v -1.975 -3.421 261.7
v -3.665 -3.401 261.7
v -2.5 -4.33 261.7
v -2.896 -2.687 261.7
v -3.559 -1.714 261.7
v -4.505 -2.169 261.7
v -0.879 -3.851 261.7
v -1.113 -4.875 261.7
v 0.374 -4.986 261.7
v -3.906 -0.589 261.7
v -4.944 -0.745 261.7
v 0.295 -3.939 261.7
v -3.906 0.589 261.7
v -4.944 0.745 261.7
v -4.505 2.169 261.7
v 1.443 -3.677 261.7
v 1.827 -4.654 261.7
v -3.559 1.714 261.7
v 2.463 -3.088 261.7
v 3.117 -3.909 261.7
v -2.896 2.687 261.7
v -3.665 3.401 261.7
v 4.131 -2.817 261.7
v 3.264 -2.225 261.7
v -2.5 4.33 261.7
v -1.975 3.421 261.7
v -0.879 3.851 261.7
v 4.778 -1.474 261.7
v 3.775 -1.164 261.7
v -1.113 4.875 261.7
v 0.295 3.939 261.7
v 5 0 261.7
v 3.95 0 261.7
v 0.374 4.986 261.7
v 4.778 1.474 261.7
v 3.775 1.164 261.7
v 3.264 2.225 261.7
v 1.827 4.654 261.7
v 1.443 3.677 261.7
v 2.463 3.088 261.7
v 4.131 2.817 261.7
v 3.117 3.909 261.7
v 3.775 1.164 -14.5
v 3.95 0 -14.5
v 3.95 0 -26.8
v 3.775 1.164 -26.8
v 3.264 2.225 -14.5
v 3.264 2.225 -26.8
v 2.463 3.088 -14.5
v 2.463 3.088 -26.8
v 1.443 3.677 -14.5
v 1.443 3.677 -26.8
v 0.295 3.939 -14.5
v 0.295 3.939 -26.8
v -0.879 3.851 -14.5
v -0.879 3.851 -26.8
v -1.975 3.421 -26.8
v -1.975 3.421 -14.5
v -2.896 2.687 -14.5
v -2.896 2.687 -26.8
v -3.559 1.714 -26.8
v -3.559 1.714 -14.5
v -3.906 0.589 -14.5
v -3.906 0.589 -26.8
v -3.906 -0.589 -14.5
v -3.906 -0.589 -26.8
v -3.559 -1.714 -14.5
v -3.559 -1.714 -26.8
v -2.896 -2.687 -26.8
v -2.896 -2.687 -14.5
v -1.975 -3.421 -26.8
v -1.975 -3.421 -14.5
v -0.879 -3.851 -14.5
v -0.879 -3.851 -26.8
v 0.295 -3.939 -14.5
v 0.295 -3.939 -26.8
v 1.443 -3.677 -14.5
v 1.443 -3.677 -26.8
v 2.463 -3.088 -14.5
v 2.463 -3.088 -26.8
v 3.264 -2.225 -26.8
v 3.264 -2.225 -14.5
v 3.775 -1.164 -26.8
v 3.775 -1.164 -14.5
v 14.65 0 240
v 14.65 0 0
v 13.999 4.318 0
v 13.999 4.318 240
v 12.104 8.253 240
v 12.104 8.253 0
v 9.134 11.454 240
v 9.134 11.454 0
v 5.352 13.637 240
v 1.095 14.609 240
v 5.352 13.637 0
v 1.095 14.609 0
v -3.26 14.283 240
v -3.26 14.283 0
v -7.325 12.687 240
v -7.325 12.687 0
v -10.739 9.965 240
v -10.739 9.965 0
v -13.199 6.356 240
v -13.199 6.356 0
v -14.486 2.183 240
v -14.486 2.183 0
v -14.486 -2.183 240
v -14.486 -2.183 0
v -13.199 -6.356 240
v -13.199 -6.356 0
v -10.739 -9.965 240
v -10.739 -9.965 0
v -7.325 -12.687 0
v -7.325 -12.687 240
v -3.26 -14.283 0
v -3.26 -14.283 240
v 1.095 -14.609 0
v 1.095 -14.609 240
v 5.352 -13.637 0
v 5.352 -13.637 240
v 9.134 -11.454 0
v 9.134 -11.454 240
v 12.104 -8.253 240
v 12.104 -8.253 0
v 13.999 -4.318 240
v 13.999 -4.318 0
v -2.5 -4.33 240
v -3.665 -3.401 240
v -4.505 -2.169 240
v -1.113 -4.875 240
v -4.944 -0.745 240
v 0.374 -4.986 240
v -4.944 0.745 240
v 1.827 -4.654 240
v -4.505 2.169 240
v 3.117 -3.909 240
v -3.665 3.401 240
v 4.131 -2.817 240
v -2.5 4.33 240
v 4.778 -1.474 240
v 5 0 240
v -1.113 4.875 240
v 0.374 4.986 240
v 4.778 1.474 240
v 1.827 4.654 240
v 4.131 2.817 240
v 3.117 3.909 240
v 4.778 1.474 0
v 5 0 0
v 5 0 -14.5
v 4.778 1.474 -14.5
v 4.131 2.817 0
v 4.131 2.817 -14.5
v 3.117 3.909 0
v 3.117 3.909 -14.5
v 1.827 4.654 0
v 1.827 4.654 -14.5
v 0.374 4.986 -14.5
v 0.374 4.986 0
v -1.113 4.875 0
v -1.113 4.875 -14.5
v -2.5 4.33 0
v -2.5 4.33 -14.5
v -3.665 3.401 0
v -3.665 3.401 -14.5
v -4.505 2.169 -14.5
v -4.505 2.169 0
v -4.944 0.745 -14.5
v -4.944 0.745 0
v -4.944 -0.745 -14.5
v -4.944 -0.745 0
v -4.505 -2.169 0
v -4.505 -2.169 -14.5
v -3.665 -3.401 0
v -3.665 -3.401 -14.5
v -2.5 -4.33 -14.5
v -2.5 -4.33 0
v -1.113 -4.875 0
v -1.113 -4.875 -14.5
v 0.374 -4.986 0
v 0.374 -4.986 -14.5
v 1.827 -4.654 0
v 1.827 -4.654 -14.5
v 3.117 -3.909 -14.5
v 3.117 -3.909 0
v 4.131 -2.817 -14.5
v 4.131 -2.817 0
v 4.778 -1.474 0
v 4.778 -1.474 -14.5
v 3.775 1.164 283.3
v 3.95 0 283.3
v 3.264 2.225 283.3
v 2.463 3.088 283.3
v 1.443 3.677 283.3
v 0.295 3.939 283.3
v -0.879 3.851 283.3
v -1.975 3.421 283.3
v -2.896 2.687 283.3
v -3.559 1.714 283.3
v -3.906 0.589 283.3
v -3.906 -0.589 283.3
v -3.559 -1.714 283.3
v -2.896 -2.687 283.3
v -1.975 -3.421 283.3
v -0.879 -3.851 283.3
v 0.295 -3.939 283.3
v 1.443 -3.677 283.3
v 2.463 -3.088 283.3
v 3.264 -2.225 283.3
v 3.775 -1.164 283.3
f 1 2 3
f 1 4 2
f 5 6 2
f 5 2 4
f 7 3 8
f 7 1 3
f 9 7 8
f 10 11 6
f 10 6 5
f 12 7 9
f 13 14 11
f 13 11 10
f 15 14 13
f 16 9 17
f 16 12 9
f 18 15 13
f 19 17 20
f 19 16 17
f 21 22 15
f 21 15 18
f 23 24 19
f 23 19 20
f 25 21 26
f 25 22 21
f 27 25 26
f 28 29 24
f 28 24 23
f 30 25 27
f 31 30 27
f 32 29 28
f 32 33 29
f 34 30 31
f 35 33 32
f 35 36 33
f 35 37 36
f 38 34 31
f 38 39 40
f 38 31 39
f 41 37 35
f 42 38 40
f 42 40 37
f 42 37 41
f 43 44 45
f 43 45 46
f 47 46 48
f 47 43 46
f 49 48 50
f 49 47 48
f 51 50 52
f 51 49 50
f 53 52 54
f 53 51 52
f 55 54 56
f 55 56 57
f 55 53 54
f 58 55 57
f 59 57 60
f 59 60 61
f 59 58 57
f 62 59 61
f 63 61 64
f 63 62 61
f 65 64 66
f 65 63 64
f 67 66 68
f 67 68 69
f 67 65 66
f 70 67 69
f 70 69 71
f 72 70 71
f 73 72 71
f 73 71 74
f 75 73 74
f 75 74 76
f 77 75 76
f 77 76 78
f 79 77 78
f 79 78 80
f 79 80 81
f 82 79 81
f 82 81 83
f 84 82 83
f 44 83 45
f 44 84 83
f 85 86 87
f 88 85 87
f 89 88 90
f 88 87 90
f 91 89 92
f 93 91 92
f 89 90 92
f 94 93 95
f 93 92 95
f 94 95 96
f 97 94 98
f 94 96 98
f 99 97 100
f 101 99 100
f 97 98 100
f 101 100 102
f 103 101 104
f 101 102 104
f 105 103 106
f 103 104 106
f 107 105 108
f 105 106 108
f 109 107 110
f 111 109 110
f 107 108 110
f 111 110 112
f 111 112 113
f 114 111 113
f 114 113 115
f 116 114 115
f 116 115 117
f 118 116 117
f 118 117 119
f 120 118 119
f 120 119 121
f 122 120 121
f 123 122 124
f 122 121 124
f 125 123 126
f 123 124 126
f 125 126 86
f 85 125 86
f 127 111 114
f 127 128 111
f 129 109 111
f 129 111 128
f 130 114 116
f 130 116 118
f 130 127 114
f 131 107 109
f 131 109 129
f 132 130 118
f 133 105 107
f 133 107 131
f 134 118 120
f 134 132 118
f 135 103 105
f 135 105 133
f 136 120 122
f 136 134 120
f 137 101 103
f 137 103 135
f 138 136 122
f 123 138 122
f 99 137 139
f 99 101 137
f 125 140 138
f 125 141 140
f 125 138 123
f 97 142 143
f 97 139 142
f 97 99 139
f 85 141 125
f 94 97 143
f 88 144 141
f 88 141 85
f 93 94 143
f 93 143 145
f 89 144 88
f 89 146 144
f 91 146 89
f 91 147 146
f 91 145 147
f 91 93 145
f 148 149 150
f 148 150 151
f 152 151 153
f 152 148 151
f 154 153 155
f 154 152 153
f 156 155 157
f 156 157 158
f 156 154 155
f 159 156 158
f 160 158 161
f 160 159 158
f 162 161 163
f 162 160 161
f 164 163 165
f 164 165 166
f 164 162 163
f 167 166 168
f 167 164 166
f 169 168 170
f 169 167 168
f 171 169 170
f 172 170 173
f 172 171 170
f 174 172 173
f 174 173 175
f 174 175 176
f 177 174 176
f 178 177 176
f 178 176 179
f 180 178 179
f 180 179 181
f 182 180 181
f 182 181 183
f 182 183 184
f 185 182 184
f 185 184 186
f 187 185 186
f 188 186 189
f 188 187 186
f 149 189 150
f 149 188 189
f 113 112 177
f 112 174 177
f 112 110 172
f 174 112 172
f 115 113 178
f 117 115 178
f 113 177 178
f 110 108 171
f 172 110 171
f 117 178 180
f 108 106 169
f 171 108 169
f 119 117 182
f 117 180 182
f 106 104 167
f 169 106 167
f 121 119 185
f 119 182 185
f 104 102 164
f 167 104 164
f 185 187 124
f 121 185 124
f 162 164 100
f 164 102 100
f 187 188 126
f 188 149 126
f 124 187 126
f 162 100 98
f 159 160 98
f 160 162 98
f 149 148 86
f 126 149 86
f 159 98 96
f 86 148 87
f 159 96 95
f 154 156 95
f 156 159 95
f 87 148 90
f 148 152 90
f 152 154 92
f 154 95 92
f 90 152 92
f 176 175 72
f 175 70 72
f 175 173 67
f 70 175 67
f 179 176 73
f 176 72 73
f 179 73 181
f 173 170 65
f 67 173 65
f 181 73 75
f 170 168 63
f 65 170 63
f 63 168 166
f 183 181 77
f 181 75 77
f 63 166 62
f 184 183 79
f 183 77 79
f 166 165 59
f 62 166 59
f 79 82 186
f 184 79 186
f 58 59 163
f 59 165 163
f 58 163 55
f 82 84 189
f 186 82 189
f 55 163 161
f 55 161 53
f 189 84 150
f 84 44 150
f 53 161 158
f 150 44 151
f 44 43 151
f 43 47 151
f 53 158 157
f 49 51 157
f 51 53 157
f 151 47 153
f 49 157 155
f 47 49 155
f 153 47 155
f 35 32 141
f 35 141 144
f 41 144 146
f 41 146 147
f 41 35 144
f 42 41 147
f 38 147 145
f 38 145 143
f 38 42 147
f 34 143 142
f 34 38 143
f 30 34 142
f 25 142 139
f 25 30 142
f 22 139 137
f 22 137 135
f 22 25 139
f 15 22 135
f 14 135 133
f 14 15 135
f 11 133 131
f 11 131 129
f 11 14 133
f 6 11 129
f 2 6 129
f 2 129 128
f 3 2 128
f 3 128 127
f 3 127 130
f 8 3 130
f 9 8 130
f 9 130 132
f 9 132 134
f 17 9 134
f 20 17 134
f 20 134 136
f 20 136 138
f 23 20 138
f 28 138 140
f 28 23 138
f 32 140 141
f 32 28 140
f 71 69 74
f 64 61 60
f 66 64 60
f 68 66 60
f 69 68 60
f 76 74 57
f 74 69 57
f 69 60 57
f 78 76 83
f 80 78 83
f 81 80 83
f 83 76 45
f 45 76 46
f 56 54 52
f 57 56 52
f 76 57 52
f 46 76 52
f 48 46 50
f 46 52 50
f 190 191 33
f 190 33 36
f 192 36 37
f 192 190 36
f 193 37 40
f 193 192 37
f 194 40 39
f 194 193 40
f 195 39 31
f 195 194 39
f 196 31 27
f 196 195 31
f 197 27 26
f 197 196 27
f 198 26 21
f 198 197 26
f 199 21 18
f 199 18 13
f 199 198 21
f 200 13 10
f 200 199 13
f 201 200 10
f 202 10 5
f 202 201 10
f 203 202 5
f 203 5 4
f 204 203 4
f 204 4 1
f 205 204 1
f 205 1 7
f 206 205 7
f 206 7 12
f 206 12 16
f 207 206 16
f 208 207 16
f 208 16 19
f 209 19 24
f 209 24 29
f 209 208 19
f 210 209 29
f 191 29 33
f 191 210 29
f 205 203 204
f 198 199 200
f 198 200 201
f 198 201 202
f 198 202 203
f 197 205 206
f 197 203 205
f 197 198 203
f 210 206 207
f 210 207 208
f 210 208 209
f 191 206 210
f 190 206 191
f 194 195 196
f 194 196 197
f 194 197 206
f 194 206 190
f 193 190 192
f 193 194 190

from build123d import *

# Parameters (mm, degrees)
SKETCH1_R           = 14.65
SKETCH1_R_2         = 5
SKETCH1_R_3         = 3.95
BOSS_EXTRUDE1_DEPTH = 240
SKETCH1_3_R         = 5
BOSS_EXTRUDE2_DEPTH = 14.5
BOSS_EXTRUDE3_START = -14.5
SKETCH1_4_R         = 3.95
BOSS_EXTRUDE3_DEPTH = 12.3
BOSS_EXTRUDE4_START = 261.7
SKETCH1_5_R         = 5
SKETCH1_5_R_2       = 3.95
BOSS_EXTRUDE4_DEPTH = 21.7
BOSS_EXTRUDE5_START = 283.3
SKETCH1_6_R         = 3.95
BOSS_EXTRUDE5_DEPTH = 21.6


with BuildPart() as part:
    # Sketch1 → Boss-Extrude1 (new body)
    # profile 1 of 3: a face of its own
    with BuildSketch(Plane.XY):
        Circle(SKETCH1_R)
        Circle(SKETCH1_R_2, mode=Mode.SUBTRACT)
    # profile 2 of 3: a face of its own
    with BuildSketch(Plane.XY):
        Circle(SKETCH1_R_2)
        Circle(SKETCH1_R_3, mode=Mode.SUBTRACT)
    # profile 3 of 3: a face of its own
    with BuildSketch(Plane.XY):
        Circle(SKETCH1_R_3)
    extrude(amount=BOSS_EXTRUDE1_DEPTH)

    # Sketch1<3> → Boss-Extrude2 (add)
    with BuildSketch(Plane.XY):
        Circle(SKETCH1_3_R)
    extrude(amount=-BOSS_EXTRUDE2_DEPTH)

    # Sketch1<4> → Boss-Extrude3 (add)
    with BuildSketch(Plane.XY.offset(BOSS_EXTRUDE3_START)):
        Circle(SKETCH1_4_R)
    extrude(amount=-BOSS_EXTRUDE3_DEPTH)

    # Sketch1<5> → Boss-Extrude4 (add)
    # profile 1 of 2: a face of its own
    with BuildSketch(Plane.XY.offset(BOSS_EXTRUDE4_START)):
        Circle(SKETCH1_5_R)
        Circle(SKETCH1_5_R_2, mode=Mode.SUBTRACT)
    # profile 2 of 2: a face of its own
    with BuildSketch(Plane.XY.offset(BOSS_EXTRUDE4_START)):
        Circle(SKETCH1_5_R_2)
    extrude(amount=-BOSS_EXTRUDE4_DEPTH)

    # Sketch1<6> → Boss-Extrude5 (add)
    with BuildSketch(Plane.XY.offset(BOSS_EXTRUDE5_START)):
        Circle(SKETCH1_6_R)
    extrude(amount=-BOSS_EXTRUDE5_DEPTH)


solid = part.part
